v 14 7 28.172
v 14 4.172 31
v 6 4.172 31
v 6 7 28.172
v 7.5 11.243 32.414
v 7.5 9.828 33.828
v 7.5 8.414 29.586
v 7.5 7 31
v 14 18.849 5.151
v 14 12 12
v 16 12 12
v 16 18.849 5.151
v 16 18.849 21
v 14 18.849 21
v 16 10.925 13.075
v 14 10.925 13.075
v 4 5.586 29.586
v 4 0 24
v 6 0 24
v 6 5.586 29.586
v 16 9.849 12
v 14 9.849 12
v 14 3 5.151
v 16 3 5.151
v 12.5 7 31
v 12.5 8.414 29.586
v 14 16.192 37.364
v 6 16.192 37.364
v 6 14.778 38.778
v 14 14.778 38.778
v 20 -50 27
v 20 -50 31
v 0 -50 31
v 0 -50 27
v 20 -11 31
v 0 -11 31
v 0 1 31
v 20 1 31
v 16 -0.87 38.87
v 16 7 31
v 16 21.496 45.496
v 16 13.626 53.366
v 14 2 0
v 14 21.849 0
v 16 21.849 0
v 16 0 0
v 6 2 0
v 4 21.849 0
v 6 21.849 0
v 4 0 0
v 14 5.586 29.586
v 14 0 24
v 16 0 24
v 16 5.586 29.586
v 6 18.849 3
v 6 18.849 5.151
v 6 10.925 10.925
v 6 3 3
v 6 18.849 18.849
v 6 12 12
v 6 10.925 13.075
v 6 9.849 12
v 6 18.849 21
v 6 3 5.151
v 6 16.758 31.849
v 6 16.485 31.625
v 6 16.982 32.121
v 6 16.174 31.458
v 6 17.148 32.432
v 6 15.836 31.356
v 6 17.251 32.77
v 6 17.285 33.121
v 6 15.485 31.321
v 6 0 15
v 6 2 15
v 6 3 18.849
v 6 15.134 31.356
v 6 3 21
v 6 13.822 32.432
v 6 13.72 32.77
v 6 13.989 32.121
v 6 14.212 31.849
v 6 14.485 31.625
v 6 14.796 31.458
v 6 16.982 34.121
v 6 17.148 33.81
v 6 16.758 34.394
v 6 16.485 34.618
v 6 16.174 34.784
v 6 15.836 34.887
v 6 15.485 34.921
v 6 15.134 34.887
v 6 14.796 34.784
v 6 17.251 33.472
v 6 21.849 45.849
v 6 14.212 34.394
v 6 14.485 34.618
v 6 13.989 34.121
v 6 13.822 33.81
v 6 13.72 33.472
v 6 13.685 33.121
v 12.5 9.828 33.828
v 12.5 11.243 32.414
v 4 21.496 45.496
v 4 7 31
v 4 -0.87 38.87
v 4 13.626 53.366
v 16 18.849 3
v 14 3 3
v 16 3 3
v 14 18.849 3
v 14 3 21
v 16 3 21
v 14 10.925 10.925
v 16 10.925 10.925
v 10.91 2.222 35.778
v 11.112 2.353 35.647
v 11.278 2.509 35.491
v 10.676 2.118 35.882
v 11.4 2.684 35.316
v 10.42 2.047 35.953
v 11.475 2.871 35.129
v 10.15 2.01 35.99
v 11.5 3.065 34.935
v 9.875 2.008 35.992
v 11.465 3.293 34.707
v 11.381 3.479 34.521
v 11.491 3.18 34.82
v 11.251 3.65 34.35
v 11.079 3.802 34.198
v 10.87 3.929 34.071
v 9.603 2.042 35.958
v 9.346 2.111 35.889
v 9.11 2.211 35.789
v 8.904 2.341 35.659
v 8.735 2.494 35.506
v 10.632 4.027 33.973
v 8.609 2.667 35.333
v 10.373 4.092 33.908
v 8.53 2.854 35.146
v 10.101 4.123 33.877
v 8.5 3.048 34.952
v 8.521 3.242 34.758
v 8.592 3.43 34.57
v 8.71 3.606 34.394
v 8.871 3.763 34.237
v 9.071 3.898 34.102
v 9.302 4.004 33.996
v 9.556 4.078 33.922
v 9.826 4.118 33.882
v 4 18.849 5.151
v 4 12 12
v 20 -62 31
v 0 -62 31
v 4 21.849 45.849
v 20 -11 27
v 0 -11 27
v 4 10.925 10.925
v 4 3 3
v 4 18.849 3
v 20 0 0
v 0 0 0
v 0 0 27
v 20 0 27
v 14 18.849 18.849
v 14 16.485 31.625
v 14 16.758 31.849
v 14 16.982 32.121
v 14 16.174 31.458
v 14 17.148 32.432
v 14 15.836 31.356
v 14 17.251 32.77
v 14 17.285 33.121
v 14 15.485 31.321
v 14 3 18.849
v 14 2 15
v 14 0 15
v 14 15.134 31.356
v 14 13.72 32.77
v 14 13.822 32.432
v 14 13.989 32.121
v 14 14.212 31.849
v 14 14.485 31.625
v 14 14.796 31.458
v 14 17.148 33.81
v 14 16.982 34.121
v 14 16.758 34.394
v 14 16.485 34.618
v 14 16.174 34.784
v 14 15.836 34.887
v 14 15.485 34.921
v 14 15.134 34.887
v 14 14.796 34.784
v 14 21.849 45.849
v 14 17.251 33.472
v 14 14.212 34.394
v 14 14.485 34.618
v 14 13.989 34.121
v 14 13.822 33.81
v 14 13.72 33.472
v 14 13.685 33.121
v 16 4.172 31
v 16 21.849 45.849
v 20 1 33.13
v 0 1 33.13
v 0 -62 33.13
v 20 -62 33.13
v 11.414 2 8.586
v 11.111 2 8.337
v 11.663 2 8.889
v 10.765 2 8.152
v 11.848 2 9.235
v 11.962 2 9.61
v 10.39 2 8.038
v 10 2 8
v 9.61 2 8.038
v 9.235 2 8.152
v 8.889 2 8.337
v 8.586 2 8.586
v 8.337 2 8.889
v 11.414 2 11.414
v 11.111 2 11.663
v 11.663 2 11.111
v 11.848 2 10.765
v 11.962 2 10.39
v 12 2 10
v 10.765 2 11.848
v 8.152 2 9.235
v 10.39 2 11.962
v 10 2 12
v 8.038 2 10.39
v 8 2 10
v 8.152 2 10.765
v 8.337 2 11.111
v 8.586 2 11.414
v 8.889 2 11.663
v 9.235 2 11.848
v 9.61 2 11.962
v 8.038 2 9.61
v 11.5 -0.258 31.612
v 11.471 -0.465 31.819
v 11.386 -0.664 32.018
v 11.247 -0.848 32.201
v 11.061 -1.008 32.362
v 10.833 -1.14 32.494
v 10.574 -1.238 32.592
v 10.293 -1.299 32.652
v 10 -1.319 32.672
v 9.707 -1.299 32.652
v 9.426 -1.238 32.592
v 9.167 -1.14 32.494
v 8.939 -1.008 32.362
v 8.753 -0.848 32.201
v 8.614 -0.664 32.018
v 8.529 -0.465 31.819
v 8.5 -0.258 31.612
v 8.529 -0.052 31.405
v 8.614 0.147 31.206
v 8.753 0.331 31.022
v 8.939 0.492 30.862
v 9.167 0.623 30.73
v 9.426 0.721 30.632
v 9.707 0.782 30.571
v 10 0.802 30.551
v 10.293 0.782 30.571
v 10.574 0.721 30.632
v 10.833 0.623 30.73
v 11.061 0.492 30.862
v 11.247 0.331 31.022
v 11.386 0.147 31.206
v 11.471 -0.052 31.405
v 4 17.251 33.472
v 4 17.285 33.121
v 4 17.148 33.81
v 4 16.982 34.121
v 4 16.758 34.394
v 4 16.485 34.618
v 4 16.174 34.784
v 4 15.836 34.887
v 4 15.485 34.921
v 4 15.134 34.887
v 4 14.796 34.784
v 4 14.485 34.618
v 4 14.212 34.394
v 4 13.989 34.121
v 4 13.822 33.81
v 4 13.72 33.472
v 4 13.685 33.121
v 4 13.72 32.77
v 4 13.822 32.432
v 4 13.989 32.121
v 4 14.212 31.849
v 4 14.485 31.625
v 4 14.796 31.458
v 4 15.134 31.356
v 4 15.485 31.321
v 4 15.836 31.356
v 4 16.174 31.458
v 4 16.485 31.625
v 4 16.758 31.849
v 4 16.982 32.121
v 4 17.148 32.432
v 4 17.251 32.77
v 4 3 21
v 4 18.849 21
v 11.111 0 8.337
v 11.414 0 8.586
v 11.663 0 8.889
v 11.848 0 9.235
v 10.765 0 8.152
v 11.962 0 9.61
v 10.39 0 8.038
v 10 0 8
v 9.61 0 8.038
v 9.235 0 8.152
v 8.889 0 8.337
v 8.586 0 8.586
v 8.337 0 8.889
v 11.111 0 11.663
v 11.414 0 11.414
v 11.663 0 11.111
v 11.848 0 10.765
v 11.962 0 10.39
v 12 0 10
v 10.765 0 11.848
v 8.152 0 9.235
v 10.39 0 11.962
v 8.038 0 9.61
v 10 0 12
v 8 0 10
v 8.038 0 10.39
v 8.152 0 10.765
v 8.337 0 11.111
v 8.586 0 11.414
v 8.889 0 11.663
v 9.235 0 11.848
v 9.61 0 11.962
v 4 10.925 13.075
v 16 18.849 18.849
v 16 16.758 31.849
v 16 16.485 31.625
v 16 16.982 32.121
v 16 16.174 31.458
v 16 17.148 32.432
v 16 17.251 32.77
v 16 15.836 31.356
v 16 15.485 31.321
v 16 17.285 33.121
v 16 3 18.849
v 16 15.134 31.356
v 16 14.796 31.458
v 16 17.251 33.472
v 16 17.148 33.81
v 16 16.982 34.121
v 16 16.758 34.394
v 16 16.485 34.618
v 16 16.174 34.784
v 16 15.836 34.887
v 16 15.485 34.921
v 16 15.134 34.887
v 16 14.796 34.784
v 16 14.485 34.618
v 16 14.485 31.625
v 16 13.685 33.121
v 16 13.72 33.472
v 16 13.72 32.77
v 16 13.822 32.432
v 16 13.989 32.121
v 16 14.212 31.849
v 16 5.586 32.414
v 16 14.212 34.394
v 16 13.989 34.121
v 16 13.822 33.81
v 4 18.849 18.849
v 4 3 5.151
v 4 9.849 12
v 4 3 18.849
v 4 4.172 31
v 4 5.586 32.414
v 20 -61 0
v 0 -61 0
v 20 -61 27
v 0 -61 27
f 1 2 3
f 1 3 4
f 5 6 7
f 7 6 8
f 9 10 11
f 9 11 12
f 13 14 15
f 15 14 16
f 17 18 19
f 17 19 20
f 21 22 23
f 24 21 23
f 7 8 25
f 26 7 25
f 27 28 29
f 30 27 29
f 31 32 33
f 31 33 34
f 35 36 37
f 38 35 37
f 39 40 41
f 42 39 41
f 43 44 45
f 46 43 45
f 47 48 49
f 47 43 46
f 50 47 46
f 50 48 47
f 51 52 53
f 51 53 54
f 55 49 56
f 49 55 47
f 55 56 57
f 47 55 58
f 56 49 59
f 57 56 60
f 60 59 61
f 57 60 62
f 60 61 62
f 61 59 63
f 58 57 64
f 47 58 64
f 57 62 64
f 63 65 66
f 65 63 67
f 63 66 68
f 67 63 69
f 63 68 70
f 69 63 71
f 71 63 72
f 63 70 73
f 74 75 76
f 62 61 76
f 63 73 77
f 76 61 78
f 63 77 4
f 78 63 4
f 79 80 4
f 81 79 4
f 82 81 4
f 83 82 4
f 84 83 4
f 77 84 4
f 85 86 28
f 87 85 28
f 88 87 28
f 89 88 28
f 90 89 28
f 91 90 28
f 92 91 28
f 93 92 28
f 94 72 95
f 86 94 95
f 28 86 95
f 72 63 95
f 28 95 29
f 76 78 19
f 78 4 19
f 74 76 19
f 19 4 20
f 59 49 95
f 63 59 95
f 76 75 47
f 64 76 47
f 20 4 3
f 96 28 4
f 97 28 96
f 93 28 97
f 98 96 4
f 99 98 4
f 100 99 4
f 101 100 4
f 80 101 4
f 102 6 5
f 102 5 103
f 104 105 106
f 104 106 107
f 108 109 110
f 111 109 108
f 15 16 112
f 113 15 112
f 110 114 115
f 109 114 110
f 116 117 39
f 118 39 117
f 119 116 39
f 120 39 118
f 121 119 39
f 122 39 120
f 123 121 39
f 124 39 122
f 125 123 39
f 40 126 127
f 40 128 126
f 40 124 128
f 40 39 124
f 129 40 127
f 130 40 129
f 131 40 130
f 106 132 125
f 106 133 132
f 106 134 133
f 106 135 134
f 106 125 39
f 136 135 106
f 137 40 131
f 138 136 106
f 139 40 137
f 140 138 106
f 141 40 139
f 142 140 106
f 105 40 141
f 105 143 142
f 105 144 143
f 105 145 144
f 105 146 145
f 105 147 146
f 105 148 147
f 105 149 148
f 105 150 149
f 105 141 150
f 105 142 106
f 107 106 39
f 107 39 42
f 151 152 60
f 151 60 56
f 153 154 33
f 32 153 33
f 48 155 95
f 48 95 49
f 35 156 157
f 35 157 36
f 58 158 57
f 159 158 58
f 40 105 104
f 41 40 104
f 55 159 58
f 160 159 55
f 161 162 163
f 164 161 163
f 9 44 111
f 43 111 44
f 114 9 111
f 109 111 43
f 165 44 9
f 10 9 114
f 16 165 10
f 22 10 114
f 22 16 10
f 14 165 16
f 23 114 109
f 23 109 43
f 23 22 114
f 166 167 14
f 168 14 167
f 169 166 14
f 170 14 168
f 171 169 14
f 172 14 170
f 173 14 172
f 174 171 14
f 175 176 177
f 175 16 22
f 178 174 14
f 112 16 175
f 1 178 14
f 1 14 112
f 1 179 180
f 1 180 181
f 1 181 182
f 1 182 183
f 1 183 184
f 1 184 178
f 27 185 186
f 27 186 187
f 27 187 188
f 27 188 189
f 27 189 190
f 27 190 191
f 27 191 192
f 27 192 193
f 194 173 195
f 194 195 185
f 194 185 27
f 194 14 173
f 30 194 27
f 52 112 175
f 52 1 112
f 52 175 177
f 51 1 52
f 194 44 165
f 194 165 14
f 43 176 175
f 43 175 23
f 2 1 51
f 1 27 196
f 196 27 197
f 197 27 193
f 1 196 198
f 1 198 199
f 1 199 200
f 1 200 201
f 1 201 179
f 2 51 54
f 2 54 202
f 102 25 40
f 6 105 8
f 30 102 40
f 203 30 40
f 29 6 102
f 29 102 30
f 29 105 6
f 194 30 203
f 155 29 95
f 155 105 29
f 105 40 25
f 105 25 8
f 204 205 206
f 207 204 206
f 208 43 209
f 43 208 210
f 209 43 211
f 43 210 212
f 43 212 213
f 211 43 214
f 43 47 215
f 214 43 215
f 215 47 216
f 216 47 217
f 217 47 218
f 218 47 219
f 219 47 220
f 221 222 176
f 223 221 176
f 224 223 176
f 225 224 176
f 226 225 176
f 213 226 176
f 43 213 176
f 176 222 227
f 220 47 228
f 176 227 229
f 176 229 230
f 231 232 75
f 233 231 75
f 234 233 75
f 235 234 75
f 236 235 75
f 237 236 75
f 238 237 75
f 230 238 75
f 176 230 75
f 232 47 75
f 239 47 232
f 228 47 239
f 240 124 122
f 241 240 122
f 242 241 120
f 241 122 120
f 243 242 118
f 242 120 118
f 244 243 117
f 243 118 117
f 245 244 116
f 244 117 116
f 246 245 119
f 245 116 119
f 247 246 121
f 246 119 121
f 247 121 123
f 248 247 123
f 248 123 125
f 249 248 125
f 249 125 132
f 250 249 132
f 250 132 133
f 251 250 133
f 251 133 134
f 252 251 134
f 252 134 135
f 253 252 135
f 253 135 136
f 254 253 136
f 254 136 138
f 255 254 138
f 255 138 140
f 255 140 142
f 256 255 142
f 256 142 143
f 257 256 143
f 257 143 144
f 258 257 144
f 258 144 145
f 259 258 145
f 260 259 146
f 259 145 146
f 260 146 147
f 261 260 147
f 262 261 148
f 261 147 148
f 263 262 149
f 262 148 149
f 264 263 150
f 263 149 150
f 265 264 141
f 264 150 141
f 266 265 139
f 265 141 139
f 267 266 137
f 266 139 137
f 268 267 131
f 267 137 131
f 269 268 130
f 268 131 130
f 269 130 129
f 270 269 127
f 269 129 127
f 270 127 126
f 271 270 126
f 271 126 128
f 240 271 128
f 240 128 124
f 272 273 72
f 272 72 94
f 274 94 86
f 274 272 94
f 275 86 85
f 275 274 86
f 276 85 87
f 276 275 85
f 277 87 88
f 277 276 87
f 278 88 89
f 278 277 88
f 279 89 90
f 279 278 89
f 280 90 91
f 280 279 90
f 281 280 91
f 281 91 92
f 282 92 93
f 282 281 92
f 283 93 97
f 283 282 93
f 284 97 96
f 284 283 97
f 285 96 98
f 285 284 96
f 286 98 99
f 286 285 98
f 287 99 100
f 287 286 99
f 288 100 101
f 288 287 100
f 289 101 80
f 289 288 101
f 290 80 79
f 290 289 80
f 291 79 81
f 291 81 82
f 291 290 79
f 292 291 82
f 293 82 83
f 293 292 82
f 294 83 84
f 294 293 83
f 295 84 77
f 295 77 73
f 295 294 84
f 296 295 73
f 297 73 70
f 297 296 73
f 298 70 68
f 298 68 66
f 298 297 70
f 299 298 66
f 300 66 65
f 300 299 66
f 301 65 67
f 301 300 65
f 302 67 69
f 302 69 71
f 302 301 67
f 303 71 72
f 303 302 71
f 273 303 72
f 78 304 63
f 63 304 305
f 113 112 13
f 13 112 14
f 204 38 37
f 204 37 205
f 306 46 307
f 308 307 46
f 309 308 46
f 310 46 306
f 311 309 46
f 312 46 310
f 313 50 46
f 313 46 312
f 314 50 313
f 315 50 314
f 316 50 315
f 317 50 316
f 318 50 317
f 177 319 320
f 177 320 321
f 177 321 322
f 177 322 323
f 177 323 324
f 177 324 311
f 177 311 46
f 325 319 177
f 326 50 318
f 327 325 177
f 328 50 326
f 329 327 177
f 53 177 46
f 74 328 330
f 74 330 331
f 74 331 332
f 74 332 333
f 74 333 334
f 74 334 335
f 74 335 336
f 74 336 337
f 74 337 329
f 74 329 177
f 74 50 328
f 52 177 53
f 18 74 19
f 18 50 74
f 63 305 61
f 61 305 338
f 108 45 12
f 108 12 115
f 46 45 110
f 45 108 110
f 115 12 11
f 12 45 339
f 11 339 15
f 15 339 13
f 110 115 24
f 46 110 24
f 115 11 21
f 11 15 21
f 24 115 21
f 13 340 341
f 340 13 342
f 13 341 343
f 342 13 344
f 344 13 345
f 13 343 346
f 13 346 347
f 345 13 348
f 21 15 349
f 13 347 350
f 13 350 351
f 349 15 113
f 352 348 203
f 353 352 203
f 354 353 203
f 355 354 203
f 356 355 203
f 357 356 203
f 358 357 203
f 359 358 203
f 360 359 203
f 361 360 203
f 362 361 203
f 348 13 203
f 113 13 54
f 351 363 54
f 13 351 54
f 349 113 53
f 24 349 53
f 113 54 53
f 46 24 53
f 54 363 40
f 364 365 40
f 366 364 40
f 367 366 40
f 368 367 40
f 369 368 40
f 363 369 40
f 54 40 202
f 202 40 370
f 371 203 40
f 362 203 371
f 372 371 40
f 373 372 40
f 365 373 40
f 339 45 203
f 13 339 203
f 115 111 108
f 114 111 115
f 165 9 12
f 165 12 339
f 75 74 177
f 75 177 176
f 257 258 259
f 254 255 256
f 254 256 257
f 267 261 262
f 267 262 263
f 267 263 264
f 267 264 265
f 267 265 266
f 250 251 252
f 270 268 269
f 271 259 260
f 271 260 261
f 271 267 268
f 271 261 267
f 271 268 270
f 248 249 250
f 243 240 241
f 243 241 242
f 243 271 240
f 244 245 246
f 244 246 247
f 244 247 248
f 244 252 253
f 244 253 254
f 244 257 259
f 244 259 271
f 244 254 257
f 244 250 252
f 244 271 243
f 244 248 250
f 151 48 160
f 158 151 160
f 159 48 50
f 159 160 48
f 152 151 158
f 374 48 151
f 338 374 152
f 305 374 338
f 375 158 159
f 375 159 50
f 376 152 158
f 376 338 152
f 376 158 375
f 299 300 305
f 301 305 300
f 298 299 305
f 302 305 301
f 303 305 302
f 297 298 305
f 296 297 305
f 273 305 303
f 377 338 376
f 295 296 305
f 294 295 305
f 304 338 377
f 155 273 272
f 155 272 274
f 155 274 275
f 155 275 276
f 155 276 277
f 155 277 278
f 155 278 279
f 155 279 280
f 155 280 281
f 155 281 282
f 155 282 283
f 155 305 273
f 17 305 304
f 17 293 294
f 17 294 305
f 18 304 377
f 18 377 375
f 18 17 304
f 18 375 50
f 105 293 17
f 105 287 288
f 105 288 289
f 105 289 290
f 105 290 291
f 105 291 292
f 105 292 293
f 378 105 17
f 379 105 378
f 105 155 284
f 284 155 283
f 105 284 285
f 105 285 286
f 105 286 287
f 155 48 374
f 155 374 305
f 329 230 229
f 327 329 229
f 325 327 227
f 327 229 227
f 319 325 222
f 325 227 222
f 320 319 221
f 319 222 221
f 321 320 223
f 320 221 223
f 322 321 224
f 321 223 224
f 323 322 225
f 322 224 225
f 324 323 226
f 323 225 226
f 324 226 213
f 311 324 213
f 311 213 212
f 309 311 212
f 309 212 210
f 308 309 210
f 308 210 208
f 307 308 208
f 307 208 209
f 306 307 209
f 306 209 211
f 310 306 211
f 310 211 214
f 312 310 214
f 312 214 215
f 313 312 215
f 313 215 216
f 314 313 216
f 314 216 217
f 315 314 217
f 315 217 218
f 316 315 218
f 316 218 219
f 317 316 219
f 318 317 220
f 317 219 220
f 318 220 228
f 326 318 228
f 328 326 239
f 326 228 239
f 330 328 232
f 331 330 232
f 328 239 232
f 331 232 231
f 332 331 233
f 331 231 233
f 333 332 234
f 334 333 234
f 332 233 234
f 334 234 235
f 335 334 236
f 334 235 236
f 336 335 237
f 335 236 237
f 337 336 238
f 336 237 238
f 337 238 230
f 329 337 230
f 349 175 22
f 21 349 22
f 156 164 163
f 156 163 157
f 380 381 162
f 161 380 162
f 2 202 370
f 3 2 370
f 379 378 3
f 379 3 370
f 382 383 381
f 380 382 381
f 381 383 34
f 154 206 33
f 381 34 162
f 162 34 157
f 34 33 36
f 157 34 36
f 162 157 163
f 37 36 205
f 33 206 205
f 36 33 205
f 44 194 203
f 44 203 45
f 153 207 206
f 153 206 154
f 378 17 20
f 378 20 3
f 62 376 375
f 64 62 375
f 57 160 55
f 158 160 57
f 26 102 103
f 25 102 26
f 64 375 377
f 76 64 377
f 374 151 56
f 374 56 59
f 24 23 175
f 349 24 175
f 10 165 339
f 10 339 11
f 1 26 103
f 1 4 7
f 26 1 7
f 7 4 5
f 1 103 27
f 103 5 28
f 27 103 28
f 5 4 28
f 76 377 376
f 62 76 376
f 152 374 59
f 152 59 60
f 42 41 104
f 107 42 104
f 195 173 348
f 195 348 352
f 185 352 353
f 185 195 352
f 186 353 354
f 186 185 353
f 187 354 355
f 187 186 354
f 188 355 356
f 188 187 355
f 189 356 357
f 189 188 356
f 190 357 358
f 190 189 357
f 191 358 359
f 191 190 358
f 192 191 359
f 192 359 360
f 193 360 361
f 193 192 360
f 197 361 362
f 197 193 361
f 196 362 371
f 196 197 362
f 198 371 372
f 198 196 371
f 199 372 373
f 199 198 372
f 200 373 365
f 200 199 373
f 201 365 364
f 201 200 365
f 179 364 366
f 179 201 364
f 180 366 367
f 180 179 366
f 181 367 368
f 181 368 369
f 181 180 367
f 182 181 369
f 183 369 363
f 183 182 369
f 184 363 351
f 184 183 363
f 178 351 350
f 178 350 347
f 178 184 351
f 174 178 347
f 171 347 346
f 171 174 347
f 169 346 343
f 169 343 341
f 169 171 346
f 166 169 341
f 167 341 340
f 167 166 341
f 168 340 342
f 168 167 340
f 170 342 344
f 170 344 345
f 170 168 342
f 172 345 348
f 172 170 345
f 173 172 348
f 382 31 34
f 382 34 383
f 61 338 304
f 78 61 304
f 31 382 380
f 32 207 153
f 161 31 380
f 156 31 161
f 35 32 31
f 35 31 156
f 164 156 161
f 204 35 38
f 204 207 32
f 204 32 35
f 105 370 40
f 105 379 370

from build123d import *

# Parameters (mm, degrees)
PAD_DEPTH           = 20
BOX_W               = 20.5
BOX_H               = 12
BOX_DEPTH           = 11.13
BOX_ROLL_ANGLE      = -1.4e-05
BOX_PITCH_ANGLE     = -45.000049
BOX_PLACEMENT_ANGLE = 90.000034
SKETCH001_R         = 1.5
PAD001_DEPTH        = 4.7
SKETCH002_R         = 1.8
PAD002_DEPTH        = 2
SKETCH003_R         = 1.8
POCKET_DEPTH        = 3.001
SKETCH004_W         = 2
SKETCH004_H         = 15
PAD003_DEPTH        = 8
SKETCH005_W         = 4
SKETCH005_H         = 5
POCKET001_DEPTH     = 32.42131
SKETCH006_R         = 2
POCKET002_DEPTH     = 2.001


with BuildPart() as pad:
    # Sketch → Pad (new body)
    with BuildSketch(Plane.YZ):
        Polygon((-61, 0), (0, 0), (0, 27), (-11, 27), (-11, 31), (1, 31), (1, 33.13), (-62, 33.13), (-62, 31), (-50, 31), (-50, 27), (-61, 27), align=None)
    extrude(amount=PAD_DEPTH)


with BuildPart() as pad001:
    # Box → Box (new body)
    with BuildSketch(Plane.XY):
        with Locations((10.25, 6)):
            Rectangle(BOX_W, BOX_H)
    extrude(amount=BOX_DEPTH)


with BuildPart() as pad001_1:
    # Box roll: moved
    add(pad001.part.rotate(Axis((0, 0, 0), (1, 0, 0)), BOX_ROLL_ANGLE))


with BuildPart() as pad001_2:
    # Box pitch: moved
    add(pad001_1.part.rotate(Axis((0, 0, 0), (0, 1, 0)), BOX_PITCH_ANGLE))


with BuildPart() as pad001_3:
    # Box placement: moved
    add(pad001_2.part.moved(Location((16, 7, 31))).rotate(Axis((16, 7, 31), (0, 0, 1)), BOX_PLACEMENT_ANGLE))

    # Sketch001 → Pad001 (new body)
    with BuildSketch(Plane(origin=(16, 7, 31), x_dir=(1, 0, 0), z_dir=(0, -0.707106, -0.707107))):
        with Locations((-6, 5.565)):
            Circle(SKETCH001_R)
    extrude(amount=PAD001_DEPTH)


with BuildPart() as pocket:
    # Sketch002 → Pad002 (new body)
    with BuildSketch(Plane.YZ.offset(4)):
        Polygon((21.849242, 0), (0, 0), (0, 24), (5.585786, 29.585786), (4.171573, 31), (5.585786, 32.414214), (7, 31), (21.849242, 45.849242), align=None)
        with Locations((15.485281, 33.12132)):
            Circle(SKETCH002_R, mode=Mode.SUBTRACT)
        Polygon((3, 18.849242), (9.849242, 12), (3, 5.150758), align=None, mode=Mode.SUBTRACT)
        Polygon((18.849242, 18.849242), (12, 12), (18.849242, 5.150758), align=None, mode=Mode.SUBTRACT)
        Polygon((3, 21), (18.849242, 21), (10.924621, 13.075379), align=None, mode=Mode.SUBTRACT)
        Polygon((10.924621, 10.924621), (3, 3), (18.849242, 3), align=None, mode=Mode.SUBTRACT)
    extrude(amount=PAD002_DEPTH)

    # Sketch003 → Pocket (cut, through all)
    with BuildSketch(Plane(origin=(4, 0, 3), x_dir=(0, -1, 0), z_dir=(0, 0, 1))):
        with Locations((-15, 7)):
            Circle(SKETCH003_R)
    extrude(amount=-POCKET_DEPTH, mode=Mode.SUBTRACT)


with BuildPart() as clone_of_pocket:
    # Clone base: copy of Pocket
    add(pocket.part)


with BuildPart() as clone_of_pocket_1:
    # Clone placement: moved
    add(clone_of_pocket.part.moved(Location((10, 0, 0))))


with BuildPart() as fusion:
    # Pad003 base: copy of Pocket
    add(pocket.part)

    # Sketch004 → Pad003 (new body)
    with BuildSketch(Plane.YZ.offset(6)):
        Polygon((7, 31), (5.585786, 32.414214), (4.171573, 31), (7, 28.171573), (16.192388, 37.363961), (14.778175, 38.778175), align=None)
        with Locations((1, 7.5)):
            Rectangle(SKETCH004_W, SKETCH004_H)
    extrude(amount=PAD003_DEPTH)

    # Sketch005 → Pocket001 (cut, through all)
    with BuildSketch(Plane(origin=(4, -12, 12), x_dir=(0, -0.707107, -0.707107), z_dir=(0, -0.707107, 0.707107))):
        with Locations((-28.870058, 6)):
            Rectangle(SKETCH005_W, SKETCH005_H)
    extrude(amount=-POCKET001_DEPTH, mode=Mode.SUBTRACT)

    # Sketch006 → Pocket002 (cut, through all)
    with BuildSketch(Plane(origin=(4, 2, 0), x_dir=(0, 0, 1), z_dir=(0, 1, 0))):
        with Locations((10, 6)):
            Circle(SKETCH006_R)
    extrude(amount=-POCKET002_DEPTH, mode=Mode.SUBTRACT)

    # Fusion: union Clone of Pocket
    add(clone_of_pocket_1.part)


solid = Compound([pad.part, pad001_3.part, fusion.part])
